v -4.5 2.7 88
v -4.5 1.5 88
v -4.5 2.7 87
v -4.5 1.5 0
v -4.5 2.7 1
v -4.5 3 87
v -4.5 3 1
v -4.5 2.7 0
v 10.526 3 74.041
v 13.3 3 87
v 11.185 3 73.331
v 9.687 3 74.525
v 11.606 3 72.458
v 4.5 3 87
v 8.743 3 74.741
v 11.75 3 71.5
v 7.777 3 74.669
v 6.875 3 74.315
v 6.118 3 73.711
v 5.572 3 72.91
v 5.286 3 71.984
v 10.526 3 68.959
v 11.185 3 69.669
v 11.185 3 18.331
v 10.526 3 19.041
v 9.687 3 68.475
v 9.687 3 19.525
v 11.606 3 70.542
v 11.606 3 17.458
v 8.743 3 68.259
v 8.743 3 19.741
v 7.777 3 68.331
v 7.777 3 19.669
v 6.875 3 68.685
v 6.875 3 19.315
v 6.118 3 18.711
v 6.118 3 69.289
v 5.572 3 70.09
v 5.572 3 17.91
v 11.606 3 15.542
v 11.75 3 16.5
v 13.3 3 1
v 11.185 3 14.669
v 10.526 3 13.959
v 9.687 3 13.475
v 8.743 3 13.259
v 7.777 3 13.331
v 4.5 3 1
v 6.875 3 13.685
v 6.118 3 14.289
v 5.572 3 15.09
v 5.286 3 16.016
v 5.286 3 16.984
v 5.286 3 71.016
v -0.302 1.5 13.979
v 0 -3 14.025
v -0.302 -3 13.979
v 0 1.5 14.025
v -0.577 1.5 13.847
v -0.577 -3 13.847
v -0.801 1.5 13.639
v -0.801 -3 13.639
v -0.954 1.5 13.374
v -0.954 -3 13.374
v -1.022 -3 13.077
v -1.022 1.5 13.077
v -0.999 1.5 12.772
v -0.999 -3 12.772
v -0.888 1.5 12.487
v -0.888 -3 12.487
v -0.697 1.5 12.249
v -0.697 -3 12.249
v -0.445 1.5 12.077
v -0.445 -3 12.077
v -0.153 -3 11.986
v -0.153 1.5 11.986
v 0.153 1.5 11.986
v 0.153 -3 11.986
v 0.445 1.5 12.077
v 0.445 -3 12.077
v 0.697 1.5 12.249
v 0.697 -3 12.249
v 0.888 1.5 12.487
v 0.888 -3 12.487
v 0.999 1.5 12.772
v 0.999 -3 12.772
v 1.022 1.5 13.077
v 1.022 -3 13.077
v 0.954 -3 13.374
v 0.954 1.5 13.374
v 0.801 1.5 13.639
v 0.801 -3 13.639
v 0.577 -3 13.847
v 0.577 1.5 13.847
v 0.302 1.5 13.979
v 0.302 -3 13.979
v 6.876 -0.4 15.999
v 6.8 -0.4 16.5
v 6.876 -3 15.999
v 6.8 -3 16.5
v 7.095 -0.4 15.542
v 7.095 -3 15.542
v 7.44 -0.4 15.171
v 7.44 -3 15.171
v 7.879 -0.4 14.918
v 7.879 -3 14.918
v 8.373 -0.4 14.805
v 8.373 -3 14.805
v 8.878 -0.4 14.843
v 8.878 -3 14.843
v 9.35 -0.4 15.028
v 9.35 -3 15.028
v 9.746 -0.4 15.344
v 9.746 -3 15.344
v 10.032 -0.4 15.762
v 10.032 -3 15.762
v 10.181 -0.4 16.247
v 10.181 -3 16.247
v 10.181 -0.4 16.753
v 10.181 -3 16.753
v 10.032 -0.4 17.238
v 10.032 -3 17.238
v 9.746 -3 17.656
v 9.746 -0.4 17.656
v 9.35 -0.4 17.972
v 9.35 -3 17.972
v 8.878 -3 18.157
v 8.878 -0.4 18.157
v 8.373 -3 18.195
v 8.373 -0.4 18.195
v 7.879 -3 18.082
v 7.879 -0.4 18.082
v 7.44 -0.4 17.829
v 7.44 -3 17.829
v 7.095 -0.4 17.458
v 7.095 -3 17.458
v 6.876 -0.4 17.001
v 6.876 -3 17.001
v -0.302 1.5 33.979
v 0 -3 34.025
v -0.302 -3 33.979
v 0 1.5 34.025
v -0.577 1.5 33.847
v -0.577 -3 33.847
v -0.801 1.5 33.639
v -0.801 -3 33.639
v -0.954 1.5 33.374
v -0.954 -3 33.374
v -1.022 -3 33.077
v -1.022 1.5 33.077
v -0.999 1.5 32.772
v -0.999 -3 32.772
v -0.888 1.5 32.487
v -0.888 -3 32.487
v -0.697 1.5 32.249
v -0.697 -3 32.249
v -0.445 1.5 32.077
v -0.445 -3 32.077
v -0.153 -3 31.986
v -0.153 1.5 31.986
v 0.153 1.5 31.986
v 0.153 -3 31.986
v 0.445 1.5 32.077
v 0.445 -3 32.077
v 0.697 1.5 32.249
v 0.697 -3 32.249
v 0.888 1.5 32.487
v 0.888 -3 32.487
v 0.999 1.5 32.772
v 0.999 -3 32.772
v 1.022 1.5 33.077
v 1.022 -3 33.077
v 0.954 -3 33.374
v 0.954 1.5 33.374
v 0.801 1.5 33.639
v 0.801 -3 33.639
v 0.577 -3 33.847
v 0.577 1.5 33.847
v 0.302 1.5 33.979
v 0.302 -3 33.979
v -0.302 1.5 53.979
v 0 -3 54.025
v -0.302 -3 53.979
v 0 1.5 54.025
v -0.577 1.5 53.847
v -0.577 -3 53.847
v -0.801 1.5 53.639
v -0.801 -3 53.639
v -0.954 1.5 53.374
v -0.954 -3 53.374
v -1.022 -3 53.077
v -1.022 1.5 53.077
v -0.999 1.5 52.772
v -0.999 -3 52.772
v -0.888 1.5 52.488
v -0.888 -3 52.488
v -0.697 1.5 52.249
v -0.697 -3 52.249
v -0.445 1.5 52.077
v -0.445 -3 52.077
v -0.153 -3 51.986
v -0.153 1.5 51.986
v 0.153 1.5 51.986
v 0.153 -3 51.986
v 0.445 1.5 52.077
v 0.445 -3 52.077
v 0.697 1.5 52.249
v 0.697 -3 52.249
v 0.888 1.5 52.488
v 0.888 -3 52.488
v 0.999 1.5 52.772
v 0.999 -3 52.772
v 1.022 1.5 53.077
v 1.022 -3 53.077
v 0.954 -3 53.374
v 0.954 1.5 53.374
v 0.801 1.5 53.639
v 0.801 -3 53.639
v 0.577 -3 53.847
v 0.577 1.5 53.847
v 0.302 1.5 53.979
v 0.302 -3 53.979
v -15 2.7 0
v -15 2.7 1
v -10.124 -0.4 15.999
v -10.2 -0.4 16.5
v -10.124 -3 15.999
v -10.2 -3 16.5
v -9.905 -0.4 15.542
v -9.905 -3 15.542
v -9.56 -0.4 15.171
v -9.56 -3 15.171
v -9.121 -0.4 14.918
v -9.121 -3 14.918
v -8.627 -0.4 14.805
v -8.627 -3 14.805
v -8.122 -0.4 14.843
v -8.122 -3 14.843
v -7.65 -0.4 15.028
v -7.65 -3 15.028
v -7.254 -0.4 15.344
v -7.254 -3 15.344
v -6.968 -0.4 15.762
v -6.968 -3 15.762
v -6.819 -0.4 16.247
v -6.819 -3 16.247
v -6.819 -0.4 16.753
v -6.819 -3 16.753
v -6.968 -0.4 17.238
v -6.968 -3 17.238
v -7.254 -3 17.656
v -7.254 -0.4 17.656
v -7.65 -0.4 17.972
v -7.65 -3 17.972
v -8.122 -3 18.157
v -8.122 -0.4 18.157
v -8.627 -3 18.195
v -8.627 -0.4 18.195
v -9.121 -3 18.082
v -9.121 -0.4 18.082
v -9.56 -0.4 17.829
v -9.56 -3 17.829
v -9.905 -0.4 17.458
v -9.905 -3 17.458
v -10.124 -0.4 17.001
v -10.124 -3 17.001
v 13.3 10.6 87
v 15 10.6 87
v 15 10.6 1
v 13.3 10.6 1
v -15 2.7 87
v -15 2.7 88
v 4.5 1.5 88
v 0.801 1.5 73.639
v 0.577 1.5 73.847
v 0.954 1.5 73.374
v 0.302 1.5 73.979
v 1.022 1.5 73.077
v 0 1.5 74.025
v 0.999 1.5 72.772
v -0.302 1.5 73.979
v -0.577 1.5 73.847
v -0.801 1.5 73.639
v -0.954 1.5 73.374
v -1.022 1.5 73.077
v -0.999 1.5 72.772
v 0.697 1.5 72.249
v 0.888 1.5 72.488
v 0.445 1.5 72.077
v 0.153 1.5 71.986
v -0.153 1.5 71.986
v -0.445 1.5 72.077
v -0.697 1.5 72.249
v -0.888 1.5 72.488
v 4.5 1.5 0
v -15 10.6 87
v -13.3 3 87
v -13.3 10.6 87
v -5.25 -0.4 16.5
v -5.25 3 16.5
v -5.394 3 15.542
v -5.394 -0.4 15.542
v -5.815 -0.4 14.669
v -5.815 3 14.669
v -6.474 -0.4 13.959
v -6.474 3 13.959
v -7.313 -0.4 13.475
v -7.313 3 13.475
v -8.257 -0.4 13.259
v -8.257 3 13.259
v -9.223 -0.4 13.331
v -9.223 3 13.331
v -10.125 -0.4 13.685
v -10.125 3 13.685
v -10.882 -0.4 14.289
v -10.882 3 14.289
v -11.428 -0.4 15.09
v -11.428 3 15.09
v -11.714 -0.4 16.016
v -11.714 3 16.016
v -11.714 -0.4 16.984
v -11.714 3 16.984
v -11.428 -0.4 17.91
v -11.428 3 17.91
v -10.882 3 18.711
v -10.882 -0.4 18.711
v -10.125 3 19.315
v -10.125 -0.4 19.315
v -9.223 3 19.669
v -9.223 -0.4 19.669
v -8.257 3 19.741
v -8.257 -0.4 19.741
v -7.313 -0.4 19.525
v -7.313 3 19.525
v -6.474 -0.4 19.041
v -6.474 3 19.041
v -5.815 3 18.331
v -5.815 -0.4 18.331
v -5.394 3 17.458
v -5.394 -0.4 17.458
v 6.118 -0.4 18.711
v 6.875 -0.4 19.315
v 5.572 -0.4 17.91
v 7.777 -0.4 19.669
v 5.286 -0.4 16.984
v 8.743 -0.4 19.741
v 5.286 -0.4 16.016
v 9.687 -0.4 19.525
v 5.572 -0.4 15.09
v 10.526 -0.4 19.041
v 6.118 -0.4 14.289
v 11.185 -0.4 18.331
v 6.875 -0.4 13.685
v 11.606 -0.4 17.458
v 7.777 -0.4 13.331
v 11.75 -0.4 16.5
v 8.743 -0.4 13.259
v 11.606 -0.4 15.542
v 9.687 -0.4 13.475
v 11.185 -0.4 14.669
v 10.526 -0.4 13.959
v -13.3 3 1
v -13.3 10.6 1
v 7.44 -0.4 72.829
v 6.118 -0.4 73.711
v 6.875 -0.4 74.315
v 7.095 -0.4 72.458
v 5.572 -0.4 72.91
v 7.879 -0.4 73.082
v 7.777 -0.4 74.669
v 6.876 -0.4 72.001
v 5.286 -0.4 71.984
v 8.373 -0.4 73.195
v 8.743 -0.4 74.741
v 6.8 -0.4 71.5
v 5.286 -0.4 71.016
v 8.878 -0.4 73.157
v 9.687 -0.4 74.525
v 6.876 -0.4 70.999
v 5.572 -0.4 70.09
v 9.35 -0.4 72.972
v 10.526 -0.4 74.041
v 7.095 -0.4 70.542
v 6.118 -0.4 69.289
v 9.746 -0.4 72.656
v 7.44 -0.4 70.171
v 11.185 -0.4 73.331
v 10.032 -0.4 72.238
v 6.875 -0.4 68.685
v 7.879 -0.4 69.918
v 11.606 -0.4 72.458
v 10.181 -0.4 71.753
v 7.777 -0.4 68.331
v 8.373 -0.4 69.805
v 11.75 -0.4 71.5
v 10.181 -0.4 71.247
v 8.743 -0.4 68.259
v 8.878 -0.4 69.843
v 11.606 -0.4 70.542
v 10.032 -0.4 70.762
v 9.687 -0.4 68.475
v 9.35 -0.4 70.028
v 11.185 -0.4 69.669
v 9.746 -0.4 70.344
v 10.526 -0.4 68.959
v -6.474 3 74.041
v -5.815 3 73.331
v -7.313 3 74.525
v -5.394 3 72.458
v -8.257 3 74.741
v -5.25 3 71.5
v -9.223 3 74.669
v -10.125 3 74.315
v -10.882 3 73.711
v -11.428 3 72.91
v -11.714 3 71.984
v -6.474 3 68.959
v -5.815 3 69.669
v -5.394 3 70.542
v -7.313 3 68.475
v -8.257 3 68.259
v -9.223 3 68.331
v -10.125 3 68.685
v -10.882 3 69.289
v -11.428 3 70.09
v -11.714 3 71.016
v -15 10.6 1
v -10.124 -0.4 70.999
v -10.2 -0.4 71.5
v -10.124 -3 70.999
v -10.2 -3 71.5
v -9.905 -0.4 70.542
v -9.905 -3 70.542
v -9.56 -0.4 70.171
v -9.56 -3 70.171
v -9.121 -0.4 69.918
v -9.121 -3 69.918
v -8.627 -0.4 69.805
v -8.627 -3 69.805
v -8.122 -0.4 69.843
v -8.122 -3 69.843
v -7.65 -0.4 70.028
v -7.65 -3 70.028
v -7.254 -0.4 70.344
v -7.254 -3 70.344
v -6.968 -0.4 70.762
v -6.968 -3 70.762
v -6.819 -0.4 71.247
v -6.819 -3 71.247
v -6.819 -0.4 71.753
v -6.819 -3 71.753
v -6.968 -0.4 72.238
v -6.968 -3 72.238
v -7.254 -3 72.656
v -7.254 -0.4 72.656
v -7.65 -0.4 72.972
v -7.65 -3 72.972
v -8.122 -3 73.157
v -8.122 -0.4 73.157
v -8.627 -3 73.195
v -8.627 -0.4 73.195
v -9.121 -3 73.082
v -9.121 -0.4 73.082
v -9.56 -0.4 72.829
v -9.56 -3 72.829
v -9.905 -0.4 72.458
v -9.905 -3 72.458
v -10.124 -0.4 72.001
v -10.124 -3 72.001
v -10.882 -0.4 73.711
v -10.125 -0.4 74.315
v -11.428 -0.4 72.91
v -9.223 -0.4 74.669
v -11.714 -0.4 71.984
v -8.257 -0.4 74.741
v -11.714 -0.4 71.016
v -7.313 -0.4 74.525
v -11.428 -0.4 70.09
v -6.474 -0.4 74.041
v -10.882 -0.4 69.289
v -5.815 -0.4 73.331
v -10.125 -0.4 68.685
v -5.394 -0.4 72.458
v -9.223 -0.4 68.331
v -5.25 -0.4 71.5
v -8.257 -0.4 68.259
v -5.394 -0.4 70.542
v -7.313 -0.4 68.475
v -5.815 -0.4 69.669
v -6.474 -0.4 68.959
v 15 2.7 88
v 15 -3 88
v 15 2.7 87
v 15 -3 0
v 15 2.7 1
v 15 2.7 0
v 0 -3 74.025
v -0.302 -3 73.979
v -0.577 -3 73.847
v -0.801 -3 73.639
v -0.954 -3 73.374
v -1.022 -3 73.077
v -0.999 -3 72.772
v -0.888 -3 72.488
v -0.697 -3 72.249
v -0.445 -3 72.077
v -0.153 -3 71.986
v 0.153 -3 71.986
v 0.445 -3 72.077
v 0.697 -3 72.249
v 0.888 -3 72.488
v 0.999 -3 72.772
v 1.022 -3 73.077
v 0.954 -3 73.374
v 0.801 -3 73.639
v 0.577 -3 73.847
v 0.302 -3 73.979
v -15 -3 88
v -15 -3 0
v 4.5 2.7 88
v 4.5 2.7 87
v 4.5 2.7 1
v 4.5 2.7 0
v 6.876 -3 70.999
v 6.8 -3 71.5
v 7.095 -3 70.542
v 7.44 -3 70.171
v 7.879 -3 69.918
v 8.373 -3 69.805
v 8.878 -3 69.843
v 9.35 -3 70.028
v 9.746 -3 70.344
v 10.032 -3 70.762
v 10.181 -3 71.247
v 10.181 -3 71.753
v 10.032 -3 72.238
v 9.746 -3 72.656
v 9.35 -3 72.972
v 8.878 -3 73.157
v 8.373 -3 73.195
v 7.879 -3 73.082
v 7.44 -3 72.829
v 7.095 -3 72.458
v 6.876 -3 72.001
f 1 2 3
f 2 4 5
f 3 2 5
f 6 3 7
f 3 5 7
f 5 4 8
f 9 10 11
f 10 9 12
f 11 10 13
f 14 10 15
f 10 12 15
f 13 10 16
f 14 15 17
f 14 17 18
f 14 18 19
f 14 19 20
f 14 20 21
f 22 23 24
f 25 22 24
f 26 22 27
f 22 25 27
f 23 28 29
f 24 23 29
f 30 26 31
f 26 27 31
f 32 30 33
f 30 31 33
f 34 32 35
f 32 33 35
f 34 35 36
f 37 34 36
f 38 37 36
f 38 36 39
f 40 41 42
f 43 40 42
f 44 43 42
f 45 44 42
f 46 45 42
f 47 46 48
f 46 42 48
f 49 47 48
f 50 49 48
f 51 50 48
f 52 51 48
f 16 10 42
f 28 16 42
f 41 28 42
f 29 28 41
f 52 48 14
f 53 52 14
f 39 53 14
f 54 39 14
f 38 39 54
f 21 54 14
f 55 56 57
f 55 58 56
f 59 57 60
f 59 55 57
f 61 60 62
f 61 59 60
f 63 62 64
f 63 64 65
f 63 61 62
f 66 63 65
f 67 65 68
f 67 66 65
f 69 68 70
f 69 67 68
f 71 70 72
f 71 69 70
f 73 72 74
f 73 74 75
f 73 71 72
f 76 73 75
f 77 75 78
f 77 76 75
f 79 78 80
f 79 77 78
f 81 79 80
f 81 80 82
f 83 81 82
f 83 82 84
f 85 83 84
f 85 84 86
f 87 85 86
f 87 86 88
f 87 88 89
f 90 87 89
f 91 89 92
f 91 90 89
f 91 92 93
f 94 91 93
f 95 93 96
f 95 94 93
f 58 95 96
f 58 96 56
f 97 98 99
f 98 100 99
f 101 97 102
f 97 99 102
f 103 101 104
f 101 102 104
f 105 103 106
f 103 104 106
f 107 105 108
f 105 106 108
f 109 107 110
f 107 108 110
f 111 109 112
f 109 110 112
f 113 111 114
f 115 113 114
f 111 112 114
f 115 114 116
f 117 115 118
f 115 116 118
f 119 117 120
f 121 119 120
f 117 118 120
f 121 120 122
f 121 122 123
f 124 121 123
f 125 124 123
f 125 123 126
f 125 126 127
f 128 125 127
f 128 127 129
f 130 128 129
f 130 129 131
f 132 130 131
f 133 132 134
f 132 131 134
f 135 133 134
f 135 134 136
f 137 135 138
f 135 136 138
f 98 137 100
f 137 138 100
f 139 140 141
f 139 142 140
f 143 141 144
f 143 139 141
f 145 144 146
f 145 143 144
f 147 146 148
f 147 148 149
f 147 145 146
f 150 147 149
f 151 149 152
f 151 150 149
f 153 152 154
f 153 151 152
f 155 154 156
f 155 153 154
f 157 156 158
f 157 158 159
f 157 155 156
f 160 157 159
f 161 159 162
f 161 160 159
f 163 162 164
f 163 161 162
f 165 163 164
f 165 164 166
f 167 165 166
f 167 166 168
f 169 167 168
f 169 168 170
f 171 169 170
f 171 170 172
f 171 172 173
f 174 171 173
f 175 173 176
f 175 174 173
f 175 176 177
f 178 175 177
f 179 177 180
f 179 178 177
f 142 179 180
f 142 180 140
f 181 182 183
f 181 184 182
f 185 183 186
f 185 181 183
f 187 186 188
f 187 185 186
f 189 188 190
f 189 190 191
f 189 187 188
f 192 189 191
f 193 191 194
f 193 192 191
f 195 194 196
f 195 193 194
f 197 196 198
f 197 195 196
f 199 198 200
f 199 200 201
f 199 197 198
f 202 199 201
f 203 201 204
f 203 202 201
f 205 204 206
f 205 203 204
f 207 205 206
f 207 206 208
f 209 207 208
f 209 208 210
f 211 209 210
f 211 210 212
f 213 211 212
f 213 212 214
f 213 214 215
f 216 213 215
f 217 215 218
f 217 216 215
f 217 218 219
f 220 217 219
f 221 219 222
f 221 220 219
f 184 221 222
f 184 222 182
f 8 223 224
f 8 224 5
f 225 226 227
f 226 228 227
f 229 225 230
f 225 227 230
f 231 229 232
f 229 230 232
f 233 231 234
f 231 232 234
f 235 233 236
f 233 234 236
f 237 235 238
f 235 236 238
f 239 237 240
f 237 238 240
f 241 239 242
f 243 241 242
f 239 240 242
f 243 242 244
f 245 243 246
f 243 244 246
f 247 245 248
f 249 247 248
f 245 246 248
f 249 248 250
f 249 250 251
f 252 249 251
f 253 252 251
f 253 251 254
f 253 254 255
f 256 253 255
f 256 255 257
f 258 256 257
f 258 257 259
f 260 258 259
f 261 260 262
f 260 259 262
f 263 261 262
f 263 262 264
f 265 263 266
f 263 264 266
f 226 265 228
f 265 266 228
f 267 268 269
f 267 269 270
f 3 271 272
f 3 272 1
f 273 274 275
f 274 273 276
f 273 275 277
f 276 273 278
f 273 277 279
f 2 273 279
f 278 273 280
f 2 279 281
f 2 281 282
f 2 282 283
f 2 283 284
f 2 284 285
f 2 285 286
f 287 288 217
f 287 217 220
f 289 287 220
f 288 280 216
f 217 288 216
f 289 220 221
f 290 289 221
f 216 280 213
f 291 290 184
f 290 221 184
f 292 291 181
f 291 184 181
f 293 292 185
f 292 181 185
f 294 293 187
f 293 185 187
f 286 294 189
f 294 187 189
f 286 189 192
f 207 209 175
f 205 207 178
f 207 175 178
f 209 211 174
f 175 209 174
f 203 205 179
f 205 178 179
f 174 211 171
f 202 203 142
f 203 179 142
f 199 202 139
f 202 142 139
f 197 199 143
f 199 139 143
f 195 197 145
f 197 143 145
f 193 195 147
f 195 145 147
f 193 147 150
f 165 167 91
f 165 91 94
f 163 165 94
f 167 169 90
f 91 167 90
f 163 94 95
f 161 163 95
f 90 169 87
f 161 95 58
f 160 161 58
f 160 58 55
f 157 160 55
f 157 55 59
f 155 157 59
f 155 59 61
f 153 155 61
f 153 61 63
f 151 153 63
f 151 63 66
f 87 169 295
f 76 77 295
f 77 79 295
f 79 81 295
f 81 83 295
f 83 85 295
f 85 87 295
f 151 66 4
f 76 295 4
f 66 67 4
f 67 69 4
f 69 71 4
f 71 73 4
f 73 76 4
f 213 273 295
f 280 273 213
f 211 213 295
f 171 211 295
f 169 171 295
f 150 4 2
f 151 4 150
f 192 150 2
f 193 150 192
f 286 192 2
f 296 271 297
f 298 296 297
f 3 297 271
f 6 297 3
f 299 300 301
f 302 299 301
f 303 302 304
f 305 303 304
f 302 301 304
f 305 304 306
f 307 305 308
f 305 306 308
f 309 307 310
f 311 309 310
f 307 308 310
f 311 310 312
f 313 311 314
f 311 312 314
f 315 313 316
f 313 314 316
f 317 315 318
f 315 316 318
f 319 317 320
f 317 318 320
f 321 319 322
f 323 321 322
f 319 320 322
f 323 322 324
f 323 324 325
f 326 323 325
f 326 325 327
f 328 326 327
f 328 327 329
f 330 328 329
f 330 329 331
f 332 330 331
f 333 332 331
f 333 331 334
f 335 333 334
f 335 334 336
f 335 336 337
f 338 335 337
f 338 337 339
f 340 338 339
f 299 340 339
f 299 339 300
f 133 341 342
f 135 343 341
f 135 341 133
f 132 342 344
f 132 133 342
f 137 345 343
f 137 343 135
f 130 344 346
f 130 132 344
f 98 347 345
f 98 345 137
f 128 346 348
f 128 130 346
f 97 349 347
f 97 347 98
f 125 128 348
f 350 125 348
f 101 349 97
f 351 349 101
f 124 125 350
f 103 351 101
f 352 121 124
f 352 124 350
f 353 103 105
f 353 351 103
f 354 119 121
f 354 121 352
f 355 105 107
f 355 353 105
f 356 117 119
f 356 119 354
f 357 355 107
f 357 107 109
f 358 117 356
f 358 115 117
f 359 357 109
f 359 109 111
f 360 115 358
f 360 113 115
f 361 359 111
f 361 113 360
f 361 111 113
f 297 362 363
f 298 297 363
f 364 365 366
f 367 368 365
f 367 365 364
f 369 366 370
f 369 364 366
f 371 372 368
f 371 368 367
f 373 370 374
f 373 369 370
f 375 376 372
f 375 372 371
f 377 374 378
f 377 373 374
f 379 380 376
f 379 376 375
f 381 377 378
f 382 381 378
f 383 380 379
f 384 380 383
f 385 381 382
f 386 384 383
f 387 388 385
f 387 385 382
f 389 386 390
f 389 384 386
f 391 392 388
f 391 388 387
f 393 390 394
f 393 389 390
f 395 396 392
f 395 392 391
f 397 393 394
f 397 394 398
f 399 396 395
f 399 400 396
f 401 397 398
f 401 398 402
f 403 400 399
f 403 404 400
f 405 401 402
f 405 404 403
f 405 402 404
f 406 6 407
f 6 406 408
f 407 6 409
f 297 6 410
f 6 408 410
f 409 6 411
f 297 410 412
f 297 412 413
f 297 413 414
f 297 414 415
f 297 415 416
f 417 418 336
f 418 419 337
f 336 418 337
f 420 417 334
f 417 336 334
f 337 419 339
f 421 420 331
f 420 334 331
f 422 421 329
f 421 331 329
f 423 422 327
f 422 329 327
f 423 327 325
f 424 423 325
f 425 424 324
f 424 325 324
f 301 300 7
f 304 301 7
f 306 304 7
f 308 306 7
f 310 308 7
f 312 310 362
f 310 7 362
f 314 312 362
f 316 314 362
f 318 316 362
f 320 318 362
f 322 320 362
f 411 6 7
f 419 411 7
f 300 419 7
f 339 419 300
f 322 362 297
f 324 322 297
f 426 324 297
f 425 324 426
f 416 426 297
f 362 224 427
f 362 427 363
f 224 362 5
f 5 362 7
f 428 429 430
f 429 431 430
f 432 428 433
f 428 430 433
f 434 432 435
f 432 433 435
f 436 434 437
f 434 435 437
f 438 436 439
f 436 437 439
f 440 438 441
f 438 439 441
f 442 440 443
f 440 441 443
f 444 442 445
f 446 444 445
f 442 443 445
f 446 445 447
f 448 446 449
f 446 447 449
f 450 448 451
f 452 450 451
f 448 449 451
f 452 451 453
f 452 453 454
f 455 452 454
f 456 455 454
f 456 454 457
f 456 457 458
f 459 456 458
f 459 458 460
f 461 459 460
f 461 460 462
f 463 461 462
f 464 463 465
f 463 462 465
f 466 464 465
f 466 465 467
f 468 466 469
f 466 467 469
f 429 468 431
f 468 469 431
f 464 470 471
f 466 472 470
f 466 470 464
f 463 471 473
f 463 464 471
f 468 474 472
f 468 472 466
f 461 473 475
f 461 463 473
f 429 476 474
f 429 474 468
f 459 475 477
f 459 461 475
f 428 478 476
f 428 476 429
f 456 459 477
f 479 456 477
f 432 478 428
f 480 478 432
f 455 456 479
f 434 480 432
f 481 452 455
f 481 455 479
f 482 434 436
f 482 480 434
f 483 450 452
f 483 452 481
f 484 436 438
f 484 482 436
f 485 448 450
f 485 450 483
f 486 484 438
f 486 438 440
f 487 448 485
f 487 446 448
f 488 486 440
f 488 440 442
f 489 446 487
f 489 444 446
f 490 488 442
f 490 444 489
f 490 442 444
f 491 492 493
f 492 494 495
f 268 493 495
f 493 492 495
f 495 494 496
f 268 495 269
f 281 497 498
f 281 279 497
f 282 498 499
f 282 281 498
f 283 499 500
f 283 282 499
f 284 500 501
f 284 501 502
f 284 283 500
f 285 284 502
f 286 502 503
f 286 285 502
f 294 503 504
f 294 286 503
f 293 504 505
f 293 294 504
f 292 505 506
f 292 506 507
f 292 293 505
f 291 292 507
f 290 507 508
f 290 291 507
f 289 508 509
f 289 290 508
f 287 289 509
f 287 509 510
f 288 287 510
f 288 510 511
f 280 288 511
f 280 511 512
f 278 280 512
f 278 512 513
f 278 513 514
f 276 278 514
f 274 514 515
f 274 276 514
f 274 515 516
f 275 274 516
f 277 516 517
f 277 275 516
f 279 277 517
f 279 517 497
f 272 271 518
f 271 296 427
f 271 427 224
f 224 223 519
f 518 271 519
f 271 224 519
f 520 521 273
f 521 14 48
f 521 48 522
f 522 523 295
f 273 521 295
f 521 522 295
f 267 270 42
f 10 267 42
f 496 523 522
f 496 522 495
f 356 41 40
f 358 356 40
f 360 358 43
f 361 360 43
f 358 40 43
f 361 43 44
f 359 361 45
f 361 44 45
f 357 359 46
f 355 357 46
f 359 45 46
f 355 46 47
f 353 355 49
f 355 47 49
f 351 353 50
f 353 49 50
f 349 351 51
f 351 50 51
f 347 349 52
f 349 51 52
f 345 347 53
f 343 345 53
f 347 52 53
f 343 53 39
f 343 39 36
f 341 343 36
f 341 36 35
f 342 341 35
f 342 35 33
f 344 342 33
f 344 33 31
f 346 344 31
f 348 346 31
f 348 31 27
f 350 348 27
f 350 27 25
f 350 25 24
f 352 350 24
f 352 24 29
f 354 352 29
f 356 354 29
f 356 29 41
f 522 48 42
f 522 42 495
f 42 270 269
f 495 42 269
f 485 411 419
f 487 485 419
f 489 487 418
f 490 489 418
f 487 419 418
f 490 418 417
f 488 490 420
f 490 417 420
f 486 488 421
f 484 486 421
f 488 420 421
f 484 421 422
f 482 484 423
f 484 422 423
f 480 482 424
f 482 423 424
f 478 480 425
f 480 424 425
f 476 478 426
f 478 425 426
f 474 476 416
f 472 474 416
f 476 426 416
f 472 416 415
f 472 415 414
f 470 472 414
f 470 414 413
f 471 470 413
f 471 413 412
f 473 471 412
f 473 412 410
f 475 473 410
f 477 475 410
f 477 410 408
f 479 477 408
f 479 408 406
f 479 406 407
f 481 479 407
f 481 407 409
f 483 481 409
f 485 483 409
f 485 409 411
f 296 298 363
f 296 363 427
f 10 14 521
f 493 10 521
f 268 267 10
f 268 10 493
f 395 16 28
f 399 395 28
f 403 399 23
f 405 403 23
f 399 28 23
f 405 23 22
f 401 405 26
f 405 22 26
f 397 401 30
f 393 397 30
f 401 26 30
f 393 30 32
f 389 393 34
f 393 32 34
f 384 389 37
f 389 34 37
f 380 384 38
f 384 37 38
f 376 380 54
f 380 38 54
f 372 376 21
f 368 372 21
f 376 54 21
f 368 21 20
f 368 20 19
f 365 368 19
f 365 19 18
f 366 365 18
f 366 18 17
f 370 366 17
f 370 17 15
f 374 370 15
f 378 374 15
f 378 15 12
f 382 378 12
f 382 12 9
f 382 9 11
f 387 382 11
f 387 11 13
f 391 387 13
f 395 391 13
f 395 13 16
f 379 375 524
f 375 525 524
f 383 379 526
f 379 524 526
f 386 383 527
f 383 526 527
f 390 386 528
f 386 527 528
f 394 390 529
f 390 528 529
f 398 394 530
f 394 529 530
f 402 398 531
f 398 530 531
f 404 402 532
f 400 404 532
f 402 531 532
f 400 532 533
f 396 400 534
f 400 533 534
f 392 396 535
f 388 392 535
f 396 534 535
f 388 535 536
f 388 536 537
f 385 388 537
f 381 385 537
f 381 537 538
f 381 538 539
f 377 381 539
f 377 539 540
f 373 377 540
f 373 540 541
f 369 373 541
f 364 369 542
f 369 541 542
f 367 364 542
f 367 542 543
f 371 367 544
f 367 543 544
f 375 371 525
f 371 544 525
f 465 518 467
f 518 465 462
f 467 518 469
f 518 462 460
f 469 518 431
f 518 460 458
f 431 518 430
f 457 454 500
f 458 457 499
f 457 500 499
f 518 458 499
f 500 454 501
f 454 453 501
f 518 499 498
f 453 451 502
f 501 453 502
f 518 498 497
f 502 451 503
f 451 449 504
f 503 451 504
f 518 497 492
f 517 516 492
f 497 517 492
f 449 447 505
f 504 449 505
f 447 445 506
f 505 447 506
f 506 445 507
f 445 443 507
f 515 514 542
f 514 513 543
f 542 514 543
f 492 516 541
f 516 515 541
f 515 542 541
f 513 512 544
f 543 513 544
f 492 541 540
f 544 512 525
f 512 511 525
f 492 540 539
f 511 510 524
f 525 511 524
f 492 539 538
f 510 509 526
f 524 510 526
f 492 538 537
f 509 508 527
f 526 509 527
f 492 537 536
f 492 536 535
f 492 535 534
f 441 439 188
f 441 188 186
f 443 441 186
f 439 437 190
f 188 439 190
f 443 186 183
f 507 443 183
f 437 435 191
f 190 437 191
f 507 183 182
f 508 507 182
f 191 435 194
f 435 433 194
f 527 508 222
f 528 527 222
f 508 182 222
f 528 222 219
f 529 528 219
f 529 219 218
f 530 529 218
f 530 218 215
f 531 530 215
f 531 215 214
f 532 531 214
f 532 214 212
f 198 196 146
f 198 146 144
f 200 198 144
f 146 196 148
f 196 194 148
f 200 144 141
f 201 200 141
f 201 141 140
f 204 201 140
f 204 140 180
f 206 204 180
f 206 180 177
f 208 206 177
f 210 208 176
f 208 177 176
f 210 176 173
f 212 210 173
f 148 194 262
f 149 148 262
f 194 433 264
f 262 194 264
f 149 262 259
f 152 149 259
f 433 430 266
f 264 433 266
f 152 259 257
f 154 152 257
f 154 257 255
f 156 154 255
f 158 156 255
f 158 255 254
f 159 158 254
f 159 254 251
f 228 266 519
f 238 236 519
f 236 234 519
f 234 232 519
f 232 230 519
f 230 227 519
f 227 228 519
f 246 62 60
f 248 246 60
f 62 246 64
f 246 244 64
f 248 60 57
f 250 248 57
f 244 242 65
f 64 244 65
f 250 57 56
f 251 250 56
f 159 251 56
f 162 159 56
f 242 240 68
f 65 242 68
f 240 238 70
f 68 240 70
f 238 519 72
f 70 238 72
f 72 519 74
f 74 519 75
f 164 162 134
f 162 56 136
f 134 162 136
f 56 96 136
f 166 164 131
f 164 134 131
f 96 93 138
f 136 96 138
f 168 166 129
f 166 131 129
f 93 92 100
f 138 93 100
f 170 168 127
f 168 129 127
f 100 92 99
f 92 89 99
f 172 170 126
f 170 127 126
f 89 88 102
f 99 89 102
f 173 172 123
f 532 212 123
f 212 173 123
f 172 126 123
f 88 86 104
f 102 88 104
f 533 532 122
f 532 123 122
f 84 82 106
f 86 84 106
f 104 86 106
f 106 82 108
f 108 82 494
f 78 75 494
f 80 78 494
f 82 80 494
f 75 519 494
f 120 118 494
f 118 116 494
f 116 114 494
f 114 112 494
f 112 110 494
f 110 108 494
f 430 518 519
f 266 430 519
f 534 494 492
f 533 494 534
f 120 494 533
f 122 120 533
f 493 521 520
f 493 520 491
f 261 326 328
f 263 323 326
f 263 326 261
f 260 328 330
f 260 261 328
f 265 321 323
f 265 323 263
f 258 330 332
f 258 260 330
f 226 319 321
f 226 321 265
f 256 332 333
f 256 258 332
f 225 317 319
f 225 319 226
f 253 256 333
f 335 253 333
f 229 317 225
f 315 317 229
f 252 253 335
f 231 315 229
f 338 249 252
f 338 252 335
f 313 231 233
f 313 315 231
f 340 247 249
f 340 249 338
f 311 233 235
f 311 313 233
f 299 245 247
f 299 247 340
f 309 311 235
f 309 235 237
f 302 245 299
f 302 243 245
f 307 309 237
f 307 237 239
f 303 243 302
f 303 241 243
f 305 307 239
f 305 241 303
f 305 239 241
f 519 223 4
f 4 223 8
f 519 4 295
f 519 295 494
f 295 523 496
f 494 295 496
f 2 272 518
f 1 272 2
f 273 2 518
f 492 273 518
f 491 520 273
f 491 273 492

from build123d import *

# Parameters (mm, degrees)
BODY_DEPTH             = 88
SKETCH_2_W             = 30
SKETCH_2_H             = 1
CUT1_DEPTH             = 7.9
FIXTURE_M3_D           = 3.4
FIXTURE_M3_DEPTH       = 6
FIXTURE_M3_CBORE_D     = 6.5
FIXTURE_M3_CBORE_DEPTH = 3.4
FIXTURE_M3_TIP         = 1.021463052
PATTERN_LINEAR_1_COUNT = 4
PATTERN_LINEAR_1_PITCH = 20


with BuildPart() as part:
    # Эскиз1 → Body (new body)
    with BuildSketch(Plane.XY):
        Polygon((-15, -3), (15, -3), (15, 3), (15, 10.6), (13.3, 10.6), (13.3, 3), (4.5, 3), (4.5, 1.5), (-4.5, 1.5), (-4.5, 3), (-13.3, 3), (-13.3, 10.6), (-15, 10.6), (-15, 3), align=None)
    extrude(amount=BODY_DEPTH)

    # Эскиз2 → Cut1 (cut)
    with BuildSketch(Plane(origin=(0, 10.6, 0), x_dir=(1, 0, 0), z_dir=(0, 1, 0))):
        with Locations((0, -87.5)):
            Rectangle(SKETCH_2_W, SKETCH_2_H)
        with Locations((0, -0.5)):
            Rectangle(SKETCH_2_W, SKETCH_2_H)
    extrude(amount=-CUT1_DEPTH, mode=Mode.SUBTRACT)

    # Fixture M3
    with Locations(Plane(origin=(-8.5, 3, 71.5), x_dir=(1, 0, 0), z_dir=(0, 1, 0))):
        with Locations((0, 0), (17, 0), (17, 55), (0, 55)):
            CounterBoreHole(FIXTURE_M3_D / 2, FIXTURE_M3_CBORE_D / 2, FIXTURE_M3_CBORE_DEPTH, depth=FIXTURE_M3_DEPTH)
            with Locations((0, 0, -(FIXTURE_M3_DEPTH + FIXTURE_M3_TIP / 2))):  # 118° drill point
                Cone(0, FIXTURE_M3_D / 2, FIXTURE_M3_TIP, mode=Mode.SUBTRACT)

    # Эскиз7 → Fixture M2 (revolve, cut)
    with BuildSketch(Plane(origin=(0, 1.5, 73), x_dir=(0, 0, 1), z_dir=(1, 0, 0))):
        Polygon((0, 0), (0, 5.115882135), (1.025, 4.5), (1.025, 0), align=None)
    fixture_m2 = revolve(axis=Axis((0, 7.85, 73), (0, -1, 0)), mode=Mode.SUBTRACT)

    # Линейный массив1: Fixture M2 ×4
    with Locations(*[(0, 0, -i * PATTERN_LINEAR_1_PITCH) for i in range(1, PATTERN_LINEAR_1_COUNT)]):
        add(fixture_m2, mode=Mode.SUBTRACT)


solid = part.part
